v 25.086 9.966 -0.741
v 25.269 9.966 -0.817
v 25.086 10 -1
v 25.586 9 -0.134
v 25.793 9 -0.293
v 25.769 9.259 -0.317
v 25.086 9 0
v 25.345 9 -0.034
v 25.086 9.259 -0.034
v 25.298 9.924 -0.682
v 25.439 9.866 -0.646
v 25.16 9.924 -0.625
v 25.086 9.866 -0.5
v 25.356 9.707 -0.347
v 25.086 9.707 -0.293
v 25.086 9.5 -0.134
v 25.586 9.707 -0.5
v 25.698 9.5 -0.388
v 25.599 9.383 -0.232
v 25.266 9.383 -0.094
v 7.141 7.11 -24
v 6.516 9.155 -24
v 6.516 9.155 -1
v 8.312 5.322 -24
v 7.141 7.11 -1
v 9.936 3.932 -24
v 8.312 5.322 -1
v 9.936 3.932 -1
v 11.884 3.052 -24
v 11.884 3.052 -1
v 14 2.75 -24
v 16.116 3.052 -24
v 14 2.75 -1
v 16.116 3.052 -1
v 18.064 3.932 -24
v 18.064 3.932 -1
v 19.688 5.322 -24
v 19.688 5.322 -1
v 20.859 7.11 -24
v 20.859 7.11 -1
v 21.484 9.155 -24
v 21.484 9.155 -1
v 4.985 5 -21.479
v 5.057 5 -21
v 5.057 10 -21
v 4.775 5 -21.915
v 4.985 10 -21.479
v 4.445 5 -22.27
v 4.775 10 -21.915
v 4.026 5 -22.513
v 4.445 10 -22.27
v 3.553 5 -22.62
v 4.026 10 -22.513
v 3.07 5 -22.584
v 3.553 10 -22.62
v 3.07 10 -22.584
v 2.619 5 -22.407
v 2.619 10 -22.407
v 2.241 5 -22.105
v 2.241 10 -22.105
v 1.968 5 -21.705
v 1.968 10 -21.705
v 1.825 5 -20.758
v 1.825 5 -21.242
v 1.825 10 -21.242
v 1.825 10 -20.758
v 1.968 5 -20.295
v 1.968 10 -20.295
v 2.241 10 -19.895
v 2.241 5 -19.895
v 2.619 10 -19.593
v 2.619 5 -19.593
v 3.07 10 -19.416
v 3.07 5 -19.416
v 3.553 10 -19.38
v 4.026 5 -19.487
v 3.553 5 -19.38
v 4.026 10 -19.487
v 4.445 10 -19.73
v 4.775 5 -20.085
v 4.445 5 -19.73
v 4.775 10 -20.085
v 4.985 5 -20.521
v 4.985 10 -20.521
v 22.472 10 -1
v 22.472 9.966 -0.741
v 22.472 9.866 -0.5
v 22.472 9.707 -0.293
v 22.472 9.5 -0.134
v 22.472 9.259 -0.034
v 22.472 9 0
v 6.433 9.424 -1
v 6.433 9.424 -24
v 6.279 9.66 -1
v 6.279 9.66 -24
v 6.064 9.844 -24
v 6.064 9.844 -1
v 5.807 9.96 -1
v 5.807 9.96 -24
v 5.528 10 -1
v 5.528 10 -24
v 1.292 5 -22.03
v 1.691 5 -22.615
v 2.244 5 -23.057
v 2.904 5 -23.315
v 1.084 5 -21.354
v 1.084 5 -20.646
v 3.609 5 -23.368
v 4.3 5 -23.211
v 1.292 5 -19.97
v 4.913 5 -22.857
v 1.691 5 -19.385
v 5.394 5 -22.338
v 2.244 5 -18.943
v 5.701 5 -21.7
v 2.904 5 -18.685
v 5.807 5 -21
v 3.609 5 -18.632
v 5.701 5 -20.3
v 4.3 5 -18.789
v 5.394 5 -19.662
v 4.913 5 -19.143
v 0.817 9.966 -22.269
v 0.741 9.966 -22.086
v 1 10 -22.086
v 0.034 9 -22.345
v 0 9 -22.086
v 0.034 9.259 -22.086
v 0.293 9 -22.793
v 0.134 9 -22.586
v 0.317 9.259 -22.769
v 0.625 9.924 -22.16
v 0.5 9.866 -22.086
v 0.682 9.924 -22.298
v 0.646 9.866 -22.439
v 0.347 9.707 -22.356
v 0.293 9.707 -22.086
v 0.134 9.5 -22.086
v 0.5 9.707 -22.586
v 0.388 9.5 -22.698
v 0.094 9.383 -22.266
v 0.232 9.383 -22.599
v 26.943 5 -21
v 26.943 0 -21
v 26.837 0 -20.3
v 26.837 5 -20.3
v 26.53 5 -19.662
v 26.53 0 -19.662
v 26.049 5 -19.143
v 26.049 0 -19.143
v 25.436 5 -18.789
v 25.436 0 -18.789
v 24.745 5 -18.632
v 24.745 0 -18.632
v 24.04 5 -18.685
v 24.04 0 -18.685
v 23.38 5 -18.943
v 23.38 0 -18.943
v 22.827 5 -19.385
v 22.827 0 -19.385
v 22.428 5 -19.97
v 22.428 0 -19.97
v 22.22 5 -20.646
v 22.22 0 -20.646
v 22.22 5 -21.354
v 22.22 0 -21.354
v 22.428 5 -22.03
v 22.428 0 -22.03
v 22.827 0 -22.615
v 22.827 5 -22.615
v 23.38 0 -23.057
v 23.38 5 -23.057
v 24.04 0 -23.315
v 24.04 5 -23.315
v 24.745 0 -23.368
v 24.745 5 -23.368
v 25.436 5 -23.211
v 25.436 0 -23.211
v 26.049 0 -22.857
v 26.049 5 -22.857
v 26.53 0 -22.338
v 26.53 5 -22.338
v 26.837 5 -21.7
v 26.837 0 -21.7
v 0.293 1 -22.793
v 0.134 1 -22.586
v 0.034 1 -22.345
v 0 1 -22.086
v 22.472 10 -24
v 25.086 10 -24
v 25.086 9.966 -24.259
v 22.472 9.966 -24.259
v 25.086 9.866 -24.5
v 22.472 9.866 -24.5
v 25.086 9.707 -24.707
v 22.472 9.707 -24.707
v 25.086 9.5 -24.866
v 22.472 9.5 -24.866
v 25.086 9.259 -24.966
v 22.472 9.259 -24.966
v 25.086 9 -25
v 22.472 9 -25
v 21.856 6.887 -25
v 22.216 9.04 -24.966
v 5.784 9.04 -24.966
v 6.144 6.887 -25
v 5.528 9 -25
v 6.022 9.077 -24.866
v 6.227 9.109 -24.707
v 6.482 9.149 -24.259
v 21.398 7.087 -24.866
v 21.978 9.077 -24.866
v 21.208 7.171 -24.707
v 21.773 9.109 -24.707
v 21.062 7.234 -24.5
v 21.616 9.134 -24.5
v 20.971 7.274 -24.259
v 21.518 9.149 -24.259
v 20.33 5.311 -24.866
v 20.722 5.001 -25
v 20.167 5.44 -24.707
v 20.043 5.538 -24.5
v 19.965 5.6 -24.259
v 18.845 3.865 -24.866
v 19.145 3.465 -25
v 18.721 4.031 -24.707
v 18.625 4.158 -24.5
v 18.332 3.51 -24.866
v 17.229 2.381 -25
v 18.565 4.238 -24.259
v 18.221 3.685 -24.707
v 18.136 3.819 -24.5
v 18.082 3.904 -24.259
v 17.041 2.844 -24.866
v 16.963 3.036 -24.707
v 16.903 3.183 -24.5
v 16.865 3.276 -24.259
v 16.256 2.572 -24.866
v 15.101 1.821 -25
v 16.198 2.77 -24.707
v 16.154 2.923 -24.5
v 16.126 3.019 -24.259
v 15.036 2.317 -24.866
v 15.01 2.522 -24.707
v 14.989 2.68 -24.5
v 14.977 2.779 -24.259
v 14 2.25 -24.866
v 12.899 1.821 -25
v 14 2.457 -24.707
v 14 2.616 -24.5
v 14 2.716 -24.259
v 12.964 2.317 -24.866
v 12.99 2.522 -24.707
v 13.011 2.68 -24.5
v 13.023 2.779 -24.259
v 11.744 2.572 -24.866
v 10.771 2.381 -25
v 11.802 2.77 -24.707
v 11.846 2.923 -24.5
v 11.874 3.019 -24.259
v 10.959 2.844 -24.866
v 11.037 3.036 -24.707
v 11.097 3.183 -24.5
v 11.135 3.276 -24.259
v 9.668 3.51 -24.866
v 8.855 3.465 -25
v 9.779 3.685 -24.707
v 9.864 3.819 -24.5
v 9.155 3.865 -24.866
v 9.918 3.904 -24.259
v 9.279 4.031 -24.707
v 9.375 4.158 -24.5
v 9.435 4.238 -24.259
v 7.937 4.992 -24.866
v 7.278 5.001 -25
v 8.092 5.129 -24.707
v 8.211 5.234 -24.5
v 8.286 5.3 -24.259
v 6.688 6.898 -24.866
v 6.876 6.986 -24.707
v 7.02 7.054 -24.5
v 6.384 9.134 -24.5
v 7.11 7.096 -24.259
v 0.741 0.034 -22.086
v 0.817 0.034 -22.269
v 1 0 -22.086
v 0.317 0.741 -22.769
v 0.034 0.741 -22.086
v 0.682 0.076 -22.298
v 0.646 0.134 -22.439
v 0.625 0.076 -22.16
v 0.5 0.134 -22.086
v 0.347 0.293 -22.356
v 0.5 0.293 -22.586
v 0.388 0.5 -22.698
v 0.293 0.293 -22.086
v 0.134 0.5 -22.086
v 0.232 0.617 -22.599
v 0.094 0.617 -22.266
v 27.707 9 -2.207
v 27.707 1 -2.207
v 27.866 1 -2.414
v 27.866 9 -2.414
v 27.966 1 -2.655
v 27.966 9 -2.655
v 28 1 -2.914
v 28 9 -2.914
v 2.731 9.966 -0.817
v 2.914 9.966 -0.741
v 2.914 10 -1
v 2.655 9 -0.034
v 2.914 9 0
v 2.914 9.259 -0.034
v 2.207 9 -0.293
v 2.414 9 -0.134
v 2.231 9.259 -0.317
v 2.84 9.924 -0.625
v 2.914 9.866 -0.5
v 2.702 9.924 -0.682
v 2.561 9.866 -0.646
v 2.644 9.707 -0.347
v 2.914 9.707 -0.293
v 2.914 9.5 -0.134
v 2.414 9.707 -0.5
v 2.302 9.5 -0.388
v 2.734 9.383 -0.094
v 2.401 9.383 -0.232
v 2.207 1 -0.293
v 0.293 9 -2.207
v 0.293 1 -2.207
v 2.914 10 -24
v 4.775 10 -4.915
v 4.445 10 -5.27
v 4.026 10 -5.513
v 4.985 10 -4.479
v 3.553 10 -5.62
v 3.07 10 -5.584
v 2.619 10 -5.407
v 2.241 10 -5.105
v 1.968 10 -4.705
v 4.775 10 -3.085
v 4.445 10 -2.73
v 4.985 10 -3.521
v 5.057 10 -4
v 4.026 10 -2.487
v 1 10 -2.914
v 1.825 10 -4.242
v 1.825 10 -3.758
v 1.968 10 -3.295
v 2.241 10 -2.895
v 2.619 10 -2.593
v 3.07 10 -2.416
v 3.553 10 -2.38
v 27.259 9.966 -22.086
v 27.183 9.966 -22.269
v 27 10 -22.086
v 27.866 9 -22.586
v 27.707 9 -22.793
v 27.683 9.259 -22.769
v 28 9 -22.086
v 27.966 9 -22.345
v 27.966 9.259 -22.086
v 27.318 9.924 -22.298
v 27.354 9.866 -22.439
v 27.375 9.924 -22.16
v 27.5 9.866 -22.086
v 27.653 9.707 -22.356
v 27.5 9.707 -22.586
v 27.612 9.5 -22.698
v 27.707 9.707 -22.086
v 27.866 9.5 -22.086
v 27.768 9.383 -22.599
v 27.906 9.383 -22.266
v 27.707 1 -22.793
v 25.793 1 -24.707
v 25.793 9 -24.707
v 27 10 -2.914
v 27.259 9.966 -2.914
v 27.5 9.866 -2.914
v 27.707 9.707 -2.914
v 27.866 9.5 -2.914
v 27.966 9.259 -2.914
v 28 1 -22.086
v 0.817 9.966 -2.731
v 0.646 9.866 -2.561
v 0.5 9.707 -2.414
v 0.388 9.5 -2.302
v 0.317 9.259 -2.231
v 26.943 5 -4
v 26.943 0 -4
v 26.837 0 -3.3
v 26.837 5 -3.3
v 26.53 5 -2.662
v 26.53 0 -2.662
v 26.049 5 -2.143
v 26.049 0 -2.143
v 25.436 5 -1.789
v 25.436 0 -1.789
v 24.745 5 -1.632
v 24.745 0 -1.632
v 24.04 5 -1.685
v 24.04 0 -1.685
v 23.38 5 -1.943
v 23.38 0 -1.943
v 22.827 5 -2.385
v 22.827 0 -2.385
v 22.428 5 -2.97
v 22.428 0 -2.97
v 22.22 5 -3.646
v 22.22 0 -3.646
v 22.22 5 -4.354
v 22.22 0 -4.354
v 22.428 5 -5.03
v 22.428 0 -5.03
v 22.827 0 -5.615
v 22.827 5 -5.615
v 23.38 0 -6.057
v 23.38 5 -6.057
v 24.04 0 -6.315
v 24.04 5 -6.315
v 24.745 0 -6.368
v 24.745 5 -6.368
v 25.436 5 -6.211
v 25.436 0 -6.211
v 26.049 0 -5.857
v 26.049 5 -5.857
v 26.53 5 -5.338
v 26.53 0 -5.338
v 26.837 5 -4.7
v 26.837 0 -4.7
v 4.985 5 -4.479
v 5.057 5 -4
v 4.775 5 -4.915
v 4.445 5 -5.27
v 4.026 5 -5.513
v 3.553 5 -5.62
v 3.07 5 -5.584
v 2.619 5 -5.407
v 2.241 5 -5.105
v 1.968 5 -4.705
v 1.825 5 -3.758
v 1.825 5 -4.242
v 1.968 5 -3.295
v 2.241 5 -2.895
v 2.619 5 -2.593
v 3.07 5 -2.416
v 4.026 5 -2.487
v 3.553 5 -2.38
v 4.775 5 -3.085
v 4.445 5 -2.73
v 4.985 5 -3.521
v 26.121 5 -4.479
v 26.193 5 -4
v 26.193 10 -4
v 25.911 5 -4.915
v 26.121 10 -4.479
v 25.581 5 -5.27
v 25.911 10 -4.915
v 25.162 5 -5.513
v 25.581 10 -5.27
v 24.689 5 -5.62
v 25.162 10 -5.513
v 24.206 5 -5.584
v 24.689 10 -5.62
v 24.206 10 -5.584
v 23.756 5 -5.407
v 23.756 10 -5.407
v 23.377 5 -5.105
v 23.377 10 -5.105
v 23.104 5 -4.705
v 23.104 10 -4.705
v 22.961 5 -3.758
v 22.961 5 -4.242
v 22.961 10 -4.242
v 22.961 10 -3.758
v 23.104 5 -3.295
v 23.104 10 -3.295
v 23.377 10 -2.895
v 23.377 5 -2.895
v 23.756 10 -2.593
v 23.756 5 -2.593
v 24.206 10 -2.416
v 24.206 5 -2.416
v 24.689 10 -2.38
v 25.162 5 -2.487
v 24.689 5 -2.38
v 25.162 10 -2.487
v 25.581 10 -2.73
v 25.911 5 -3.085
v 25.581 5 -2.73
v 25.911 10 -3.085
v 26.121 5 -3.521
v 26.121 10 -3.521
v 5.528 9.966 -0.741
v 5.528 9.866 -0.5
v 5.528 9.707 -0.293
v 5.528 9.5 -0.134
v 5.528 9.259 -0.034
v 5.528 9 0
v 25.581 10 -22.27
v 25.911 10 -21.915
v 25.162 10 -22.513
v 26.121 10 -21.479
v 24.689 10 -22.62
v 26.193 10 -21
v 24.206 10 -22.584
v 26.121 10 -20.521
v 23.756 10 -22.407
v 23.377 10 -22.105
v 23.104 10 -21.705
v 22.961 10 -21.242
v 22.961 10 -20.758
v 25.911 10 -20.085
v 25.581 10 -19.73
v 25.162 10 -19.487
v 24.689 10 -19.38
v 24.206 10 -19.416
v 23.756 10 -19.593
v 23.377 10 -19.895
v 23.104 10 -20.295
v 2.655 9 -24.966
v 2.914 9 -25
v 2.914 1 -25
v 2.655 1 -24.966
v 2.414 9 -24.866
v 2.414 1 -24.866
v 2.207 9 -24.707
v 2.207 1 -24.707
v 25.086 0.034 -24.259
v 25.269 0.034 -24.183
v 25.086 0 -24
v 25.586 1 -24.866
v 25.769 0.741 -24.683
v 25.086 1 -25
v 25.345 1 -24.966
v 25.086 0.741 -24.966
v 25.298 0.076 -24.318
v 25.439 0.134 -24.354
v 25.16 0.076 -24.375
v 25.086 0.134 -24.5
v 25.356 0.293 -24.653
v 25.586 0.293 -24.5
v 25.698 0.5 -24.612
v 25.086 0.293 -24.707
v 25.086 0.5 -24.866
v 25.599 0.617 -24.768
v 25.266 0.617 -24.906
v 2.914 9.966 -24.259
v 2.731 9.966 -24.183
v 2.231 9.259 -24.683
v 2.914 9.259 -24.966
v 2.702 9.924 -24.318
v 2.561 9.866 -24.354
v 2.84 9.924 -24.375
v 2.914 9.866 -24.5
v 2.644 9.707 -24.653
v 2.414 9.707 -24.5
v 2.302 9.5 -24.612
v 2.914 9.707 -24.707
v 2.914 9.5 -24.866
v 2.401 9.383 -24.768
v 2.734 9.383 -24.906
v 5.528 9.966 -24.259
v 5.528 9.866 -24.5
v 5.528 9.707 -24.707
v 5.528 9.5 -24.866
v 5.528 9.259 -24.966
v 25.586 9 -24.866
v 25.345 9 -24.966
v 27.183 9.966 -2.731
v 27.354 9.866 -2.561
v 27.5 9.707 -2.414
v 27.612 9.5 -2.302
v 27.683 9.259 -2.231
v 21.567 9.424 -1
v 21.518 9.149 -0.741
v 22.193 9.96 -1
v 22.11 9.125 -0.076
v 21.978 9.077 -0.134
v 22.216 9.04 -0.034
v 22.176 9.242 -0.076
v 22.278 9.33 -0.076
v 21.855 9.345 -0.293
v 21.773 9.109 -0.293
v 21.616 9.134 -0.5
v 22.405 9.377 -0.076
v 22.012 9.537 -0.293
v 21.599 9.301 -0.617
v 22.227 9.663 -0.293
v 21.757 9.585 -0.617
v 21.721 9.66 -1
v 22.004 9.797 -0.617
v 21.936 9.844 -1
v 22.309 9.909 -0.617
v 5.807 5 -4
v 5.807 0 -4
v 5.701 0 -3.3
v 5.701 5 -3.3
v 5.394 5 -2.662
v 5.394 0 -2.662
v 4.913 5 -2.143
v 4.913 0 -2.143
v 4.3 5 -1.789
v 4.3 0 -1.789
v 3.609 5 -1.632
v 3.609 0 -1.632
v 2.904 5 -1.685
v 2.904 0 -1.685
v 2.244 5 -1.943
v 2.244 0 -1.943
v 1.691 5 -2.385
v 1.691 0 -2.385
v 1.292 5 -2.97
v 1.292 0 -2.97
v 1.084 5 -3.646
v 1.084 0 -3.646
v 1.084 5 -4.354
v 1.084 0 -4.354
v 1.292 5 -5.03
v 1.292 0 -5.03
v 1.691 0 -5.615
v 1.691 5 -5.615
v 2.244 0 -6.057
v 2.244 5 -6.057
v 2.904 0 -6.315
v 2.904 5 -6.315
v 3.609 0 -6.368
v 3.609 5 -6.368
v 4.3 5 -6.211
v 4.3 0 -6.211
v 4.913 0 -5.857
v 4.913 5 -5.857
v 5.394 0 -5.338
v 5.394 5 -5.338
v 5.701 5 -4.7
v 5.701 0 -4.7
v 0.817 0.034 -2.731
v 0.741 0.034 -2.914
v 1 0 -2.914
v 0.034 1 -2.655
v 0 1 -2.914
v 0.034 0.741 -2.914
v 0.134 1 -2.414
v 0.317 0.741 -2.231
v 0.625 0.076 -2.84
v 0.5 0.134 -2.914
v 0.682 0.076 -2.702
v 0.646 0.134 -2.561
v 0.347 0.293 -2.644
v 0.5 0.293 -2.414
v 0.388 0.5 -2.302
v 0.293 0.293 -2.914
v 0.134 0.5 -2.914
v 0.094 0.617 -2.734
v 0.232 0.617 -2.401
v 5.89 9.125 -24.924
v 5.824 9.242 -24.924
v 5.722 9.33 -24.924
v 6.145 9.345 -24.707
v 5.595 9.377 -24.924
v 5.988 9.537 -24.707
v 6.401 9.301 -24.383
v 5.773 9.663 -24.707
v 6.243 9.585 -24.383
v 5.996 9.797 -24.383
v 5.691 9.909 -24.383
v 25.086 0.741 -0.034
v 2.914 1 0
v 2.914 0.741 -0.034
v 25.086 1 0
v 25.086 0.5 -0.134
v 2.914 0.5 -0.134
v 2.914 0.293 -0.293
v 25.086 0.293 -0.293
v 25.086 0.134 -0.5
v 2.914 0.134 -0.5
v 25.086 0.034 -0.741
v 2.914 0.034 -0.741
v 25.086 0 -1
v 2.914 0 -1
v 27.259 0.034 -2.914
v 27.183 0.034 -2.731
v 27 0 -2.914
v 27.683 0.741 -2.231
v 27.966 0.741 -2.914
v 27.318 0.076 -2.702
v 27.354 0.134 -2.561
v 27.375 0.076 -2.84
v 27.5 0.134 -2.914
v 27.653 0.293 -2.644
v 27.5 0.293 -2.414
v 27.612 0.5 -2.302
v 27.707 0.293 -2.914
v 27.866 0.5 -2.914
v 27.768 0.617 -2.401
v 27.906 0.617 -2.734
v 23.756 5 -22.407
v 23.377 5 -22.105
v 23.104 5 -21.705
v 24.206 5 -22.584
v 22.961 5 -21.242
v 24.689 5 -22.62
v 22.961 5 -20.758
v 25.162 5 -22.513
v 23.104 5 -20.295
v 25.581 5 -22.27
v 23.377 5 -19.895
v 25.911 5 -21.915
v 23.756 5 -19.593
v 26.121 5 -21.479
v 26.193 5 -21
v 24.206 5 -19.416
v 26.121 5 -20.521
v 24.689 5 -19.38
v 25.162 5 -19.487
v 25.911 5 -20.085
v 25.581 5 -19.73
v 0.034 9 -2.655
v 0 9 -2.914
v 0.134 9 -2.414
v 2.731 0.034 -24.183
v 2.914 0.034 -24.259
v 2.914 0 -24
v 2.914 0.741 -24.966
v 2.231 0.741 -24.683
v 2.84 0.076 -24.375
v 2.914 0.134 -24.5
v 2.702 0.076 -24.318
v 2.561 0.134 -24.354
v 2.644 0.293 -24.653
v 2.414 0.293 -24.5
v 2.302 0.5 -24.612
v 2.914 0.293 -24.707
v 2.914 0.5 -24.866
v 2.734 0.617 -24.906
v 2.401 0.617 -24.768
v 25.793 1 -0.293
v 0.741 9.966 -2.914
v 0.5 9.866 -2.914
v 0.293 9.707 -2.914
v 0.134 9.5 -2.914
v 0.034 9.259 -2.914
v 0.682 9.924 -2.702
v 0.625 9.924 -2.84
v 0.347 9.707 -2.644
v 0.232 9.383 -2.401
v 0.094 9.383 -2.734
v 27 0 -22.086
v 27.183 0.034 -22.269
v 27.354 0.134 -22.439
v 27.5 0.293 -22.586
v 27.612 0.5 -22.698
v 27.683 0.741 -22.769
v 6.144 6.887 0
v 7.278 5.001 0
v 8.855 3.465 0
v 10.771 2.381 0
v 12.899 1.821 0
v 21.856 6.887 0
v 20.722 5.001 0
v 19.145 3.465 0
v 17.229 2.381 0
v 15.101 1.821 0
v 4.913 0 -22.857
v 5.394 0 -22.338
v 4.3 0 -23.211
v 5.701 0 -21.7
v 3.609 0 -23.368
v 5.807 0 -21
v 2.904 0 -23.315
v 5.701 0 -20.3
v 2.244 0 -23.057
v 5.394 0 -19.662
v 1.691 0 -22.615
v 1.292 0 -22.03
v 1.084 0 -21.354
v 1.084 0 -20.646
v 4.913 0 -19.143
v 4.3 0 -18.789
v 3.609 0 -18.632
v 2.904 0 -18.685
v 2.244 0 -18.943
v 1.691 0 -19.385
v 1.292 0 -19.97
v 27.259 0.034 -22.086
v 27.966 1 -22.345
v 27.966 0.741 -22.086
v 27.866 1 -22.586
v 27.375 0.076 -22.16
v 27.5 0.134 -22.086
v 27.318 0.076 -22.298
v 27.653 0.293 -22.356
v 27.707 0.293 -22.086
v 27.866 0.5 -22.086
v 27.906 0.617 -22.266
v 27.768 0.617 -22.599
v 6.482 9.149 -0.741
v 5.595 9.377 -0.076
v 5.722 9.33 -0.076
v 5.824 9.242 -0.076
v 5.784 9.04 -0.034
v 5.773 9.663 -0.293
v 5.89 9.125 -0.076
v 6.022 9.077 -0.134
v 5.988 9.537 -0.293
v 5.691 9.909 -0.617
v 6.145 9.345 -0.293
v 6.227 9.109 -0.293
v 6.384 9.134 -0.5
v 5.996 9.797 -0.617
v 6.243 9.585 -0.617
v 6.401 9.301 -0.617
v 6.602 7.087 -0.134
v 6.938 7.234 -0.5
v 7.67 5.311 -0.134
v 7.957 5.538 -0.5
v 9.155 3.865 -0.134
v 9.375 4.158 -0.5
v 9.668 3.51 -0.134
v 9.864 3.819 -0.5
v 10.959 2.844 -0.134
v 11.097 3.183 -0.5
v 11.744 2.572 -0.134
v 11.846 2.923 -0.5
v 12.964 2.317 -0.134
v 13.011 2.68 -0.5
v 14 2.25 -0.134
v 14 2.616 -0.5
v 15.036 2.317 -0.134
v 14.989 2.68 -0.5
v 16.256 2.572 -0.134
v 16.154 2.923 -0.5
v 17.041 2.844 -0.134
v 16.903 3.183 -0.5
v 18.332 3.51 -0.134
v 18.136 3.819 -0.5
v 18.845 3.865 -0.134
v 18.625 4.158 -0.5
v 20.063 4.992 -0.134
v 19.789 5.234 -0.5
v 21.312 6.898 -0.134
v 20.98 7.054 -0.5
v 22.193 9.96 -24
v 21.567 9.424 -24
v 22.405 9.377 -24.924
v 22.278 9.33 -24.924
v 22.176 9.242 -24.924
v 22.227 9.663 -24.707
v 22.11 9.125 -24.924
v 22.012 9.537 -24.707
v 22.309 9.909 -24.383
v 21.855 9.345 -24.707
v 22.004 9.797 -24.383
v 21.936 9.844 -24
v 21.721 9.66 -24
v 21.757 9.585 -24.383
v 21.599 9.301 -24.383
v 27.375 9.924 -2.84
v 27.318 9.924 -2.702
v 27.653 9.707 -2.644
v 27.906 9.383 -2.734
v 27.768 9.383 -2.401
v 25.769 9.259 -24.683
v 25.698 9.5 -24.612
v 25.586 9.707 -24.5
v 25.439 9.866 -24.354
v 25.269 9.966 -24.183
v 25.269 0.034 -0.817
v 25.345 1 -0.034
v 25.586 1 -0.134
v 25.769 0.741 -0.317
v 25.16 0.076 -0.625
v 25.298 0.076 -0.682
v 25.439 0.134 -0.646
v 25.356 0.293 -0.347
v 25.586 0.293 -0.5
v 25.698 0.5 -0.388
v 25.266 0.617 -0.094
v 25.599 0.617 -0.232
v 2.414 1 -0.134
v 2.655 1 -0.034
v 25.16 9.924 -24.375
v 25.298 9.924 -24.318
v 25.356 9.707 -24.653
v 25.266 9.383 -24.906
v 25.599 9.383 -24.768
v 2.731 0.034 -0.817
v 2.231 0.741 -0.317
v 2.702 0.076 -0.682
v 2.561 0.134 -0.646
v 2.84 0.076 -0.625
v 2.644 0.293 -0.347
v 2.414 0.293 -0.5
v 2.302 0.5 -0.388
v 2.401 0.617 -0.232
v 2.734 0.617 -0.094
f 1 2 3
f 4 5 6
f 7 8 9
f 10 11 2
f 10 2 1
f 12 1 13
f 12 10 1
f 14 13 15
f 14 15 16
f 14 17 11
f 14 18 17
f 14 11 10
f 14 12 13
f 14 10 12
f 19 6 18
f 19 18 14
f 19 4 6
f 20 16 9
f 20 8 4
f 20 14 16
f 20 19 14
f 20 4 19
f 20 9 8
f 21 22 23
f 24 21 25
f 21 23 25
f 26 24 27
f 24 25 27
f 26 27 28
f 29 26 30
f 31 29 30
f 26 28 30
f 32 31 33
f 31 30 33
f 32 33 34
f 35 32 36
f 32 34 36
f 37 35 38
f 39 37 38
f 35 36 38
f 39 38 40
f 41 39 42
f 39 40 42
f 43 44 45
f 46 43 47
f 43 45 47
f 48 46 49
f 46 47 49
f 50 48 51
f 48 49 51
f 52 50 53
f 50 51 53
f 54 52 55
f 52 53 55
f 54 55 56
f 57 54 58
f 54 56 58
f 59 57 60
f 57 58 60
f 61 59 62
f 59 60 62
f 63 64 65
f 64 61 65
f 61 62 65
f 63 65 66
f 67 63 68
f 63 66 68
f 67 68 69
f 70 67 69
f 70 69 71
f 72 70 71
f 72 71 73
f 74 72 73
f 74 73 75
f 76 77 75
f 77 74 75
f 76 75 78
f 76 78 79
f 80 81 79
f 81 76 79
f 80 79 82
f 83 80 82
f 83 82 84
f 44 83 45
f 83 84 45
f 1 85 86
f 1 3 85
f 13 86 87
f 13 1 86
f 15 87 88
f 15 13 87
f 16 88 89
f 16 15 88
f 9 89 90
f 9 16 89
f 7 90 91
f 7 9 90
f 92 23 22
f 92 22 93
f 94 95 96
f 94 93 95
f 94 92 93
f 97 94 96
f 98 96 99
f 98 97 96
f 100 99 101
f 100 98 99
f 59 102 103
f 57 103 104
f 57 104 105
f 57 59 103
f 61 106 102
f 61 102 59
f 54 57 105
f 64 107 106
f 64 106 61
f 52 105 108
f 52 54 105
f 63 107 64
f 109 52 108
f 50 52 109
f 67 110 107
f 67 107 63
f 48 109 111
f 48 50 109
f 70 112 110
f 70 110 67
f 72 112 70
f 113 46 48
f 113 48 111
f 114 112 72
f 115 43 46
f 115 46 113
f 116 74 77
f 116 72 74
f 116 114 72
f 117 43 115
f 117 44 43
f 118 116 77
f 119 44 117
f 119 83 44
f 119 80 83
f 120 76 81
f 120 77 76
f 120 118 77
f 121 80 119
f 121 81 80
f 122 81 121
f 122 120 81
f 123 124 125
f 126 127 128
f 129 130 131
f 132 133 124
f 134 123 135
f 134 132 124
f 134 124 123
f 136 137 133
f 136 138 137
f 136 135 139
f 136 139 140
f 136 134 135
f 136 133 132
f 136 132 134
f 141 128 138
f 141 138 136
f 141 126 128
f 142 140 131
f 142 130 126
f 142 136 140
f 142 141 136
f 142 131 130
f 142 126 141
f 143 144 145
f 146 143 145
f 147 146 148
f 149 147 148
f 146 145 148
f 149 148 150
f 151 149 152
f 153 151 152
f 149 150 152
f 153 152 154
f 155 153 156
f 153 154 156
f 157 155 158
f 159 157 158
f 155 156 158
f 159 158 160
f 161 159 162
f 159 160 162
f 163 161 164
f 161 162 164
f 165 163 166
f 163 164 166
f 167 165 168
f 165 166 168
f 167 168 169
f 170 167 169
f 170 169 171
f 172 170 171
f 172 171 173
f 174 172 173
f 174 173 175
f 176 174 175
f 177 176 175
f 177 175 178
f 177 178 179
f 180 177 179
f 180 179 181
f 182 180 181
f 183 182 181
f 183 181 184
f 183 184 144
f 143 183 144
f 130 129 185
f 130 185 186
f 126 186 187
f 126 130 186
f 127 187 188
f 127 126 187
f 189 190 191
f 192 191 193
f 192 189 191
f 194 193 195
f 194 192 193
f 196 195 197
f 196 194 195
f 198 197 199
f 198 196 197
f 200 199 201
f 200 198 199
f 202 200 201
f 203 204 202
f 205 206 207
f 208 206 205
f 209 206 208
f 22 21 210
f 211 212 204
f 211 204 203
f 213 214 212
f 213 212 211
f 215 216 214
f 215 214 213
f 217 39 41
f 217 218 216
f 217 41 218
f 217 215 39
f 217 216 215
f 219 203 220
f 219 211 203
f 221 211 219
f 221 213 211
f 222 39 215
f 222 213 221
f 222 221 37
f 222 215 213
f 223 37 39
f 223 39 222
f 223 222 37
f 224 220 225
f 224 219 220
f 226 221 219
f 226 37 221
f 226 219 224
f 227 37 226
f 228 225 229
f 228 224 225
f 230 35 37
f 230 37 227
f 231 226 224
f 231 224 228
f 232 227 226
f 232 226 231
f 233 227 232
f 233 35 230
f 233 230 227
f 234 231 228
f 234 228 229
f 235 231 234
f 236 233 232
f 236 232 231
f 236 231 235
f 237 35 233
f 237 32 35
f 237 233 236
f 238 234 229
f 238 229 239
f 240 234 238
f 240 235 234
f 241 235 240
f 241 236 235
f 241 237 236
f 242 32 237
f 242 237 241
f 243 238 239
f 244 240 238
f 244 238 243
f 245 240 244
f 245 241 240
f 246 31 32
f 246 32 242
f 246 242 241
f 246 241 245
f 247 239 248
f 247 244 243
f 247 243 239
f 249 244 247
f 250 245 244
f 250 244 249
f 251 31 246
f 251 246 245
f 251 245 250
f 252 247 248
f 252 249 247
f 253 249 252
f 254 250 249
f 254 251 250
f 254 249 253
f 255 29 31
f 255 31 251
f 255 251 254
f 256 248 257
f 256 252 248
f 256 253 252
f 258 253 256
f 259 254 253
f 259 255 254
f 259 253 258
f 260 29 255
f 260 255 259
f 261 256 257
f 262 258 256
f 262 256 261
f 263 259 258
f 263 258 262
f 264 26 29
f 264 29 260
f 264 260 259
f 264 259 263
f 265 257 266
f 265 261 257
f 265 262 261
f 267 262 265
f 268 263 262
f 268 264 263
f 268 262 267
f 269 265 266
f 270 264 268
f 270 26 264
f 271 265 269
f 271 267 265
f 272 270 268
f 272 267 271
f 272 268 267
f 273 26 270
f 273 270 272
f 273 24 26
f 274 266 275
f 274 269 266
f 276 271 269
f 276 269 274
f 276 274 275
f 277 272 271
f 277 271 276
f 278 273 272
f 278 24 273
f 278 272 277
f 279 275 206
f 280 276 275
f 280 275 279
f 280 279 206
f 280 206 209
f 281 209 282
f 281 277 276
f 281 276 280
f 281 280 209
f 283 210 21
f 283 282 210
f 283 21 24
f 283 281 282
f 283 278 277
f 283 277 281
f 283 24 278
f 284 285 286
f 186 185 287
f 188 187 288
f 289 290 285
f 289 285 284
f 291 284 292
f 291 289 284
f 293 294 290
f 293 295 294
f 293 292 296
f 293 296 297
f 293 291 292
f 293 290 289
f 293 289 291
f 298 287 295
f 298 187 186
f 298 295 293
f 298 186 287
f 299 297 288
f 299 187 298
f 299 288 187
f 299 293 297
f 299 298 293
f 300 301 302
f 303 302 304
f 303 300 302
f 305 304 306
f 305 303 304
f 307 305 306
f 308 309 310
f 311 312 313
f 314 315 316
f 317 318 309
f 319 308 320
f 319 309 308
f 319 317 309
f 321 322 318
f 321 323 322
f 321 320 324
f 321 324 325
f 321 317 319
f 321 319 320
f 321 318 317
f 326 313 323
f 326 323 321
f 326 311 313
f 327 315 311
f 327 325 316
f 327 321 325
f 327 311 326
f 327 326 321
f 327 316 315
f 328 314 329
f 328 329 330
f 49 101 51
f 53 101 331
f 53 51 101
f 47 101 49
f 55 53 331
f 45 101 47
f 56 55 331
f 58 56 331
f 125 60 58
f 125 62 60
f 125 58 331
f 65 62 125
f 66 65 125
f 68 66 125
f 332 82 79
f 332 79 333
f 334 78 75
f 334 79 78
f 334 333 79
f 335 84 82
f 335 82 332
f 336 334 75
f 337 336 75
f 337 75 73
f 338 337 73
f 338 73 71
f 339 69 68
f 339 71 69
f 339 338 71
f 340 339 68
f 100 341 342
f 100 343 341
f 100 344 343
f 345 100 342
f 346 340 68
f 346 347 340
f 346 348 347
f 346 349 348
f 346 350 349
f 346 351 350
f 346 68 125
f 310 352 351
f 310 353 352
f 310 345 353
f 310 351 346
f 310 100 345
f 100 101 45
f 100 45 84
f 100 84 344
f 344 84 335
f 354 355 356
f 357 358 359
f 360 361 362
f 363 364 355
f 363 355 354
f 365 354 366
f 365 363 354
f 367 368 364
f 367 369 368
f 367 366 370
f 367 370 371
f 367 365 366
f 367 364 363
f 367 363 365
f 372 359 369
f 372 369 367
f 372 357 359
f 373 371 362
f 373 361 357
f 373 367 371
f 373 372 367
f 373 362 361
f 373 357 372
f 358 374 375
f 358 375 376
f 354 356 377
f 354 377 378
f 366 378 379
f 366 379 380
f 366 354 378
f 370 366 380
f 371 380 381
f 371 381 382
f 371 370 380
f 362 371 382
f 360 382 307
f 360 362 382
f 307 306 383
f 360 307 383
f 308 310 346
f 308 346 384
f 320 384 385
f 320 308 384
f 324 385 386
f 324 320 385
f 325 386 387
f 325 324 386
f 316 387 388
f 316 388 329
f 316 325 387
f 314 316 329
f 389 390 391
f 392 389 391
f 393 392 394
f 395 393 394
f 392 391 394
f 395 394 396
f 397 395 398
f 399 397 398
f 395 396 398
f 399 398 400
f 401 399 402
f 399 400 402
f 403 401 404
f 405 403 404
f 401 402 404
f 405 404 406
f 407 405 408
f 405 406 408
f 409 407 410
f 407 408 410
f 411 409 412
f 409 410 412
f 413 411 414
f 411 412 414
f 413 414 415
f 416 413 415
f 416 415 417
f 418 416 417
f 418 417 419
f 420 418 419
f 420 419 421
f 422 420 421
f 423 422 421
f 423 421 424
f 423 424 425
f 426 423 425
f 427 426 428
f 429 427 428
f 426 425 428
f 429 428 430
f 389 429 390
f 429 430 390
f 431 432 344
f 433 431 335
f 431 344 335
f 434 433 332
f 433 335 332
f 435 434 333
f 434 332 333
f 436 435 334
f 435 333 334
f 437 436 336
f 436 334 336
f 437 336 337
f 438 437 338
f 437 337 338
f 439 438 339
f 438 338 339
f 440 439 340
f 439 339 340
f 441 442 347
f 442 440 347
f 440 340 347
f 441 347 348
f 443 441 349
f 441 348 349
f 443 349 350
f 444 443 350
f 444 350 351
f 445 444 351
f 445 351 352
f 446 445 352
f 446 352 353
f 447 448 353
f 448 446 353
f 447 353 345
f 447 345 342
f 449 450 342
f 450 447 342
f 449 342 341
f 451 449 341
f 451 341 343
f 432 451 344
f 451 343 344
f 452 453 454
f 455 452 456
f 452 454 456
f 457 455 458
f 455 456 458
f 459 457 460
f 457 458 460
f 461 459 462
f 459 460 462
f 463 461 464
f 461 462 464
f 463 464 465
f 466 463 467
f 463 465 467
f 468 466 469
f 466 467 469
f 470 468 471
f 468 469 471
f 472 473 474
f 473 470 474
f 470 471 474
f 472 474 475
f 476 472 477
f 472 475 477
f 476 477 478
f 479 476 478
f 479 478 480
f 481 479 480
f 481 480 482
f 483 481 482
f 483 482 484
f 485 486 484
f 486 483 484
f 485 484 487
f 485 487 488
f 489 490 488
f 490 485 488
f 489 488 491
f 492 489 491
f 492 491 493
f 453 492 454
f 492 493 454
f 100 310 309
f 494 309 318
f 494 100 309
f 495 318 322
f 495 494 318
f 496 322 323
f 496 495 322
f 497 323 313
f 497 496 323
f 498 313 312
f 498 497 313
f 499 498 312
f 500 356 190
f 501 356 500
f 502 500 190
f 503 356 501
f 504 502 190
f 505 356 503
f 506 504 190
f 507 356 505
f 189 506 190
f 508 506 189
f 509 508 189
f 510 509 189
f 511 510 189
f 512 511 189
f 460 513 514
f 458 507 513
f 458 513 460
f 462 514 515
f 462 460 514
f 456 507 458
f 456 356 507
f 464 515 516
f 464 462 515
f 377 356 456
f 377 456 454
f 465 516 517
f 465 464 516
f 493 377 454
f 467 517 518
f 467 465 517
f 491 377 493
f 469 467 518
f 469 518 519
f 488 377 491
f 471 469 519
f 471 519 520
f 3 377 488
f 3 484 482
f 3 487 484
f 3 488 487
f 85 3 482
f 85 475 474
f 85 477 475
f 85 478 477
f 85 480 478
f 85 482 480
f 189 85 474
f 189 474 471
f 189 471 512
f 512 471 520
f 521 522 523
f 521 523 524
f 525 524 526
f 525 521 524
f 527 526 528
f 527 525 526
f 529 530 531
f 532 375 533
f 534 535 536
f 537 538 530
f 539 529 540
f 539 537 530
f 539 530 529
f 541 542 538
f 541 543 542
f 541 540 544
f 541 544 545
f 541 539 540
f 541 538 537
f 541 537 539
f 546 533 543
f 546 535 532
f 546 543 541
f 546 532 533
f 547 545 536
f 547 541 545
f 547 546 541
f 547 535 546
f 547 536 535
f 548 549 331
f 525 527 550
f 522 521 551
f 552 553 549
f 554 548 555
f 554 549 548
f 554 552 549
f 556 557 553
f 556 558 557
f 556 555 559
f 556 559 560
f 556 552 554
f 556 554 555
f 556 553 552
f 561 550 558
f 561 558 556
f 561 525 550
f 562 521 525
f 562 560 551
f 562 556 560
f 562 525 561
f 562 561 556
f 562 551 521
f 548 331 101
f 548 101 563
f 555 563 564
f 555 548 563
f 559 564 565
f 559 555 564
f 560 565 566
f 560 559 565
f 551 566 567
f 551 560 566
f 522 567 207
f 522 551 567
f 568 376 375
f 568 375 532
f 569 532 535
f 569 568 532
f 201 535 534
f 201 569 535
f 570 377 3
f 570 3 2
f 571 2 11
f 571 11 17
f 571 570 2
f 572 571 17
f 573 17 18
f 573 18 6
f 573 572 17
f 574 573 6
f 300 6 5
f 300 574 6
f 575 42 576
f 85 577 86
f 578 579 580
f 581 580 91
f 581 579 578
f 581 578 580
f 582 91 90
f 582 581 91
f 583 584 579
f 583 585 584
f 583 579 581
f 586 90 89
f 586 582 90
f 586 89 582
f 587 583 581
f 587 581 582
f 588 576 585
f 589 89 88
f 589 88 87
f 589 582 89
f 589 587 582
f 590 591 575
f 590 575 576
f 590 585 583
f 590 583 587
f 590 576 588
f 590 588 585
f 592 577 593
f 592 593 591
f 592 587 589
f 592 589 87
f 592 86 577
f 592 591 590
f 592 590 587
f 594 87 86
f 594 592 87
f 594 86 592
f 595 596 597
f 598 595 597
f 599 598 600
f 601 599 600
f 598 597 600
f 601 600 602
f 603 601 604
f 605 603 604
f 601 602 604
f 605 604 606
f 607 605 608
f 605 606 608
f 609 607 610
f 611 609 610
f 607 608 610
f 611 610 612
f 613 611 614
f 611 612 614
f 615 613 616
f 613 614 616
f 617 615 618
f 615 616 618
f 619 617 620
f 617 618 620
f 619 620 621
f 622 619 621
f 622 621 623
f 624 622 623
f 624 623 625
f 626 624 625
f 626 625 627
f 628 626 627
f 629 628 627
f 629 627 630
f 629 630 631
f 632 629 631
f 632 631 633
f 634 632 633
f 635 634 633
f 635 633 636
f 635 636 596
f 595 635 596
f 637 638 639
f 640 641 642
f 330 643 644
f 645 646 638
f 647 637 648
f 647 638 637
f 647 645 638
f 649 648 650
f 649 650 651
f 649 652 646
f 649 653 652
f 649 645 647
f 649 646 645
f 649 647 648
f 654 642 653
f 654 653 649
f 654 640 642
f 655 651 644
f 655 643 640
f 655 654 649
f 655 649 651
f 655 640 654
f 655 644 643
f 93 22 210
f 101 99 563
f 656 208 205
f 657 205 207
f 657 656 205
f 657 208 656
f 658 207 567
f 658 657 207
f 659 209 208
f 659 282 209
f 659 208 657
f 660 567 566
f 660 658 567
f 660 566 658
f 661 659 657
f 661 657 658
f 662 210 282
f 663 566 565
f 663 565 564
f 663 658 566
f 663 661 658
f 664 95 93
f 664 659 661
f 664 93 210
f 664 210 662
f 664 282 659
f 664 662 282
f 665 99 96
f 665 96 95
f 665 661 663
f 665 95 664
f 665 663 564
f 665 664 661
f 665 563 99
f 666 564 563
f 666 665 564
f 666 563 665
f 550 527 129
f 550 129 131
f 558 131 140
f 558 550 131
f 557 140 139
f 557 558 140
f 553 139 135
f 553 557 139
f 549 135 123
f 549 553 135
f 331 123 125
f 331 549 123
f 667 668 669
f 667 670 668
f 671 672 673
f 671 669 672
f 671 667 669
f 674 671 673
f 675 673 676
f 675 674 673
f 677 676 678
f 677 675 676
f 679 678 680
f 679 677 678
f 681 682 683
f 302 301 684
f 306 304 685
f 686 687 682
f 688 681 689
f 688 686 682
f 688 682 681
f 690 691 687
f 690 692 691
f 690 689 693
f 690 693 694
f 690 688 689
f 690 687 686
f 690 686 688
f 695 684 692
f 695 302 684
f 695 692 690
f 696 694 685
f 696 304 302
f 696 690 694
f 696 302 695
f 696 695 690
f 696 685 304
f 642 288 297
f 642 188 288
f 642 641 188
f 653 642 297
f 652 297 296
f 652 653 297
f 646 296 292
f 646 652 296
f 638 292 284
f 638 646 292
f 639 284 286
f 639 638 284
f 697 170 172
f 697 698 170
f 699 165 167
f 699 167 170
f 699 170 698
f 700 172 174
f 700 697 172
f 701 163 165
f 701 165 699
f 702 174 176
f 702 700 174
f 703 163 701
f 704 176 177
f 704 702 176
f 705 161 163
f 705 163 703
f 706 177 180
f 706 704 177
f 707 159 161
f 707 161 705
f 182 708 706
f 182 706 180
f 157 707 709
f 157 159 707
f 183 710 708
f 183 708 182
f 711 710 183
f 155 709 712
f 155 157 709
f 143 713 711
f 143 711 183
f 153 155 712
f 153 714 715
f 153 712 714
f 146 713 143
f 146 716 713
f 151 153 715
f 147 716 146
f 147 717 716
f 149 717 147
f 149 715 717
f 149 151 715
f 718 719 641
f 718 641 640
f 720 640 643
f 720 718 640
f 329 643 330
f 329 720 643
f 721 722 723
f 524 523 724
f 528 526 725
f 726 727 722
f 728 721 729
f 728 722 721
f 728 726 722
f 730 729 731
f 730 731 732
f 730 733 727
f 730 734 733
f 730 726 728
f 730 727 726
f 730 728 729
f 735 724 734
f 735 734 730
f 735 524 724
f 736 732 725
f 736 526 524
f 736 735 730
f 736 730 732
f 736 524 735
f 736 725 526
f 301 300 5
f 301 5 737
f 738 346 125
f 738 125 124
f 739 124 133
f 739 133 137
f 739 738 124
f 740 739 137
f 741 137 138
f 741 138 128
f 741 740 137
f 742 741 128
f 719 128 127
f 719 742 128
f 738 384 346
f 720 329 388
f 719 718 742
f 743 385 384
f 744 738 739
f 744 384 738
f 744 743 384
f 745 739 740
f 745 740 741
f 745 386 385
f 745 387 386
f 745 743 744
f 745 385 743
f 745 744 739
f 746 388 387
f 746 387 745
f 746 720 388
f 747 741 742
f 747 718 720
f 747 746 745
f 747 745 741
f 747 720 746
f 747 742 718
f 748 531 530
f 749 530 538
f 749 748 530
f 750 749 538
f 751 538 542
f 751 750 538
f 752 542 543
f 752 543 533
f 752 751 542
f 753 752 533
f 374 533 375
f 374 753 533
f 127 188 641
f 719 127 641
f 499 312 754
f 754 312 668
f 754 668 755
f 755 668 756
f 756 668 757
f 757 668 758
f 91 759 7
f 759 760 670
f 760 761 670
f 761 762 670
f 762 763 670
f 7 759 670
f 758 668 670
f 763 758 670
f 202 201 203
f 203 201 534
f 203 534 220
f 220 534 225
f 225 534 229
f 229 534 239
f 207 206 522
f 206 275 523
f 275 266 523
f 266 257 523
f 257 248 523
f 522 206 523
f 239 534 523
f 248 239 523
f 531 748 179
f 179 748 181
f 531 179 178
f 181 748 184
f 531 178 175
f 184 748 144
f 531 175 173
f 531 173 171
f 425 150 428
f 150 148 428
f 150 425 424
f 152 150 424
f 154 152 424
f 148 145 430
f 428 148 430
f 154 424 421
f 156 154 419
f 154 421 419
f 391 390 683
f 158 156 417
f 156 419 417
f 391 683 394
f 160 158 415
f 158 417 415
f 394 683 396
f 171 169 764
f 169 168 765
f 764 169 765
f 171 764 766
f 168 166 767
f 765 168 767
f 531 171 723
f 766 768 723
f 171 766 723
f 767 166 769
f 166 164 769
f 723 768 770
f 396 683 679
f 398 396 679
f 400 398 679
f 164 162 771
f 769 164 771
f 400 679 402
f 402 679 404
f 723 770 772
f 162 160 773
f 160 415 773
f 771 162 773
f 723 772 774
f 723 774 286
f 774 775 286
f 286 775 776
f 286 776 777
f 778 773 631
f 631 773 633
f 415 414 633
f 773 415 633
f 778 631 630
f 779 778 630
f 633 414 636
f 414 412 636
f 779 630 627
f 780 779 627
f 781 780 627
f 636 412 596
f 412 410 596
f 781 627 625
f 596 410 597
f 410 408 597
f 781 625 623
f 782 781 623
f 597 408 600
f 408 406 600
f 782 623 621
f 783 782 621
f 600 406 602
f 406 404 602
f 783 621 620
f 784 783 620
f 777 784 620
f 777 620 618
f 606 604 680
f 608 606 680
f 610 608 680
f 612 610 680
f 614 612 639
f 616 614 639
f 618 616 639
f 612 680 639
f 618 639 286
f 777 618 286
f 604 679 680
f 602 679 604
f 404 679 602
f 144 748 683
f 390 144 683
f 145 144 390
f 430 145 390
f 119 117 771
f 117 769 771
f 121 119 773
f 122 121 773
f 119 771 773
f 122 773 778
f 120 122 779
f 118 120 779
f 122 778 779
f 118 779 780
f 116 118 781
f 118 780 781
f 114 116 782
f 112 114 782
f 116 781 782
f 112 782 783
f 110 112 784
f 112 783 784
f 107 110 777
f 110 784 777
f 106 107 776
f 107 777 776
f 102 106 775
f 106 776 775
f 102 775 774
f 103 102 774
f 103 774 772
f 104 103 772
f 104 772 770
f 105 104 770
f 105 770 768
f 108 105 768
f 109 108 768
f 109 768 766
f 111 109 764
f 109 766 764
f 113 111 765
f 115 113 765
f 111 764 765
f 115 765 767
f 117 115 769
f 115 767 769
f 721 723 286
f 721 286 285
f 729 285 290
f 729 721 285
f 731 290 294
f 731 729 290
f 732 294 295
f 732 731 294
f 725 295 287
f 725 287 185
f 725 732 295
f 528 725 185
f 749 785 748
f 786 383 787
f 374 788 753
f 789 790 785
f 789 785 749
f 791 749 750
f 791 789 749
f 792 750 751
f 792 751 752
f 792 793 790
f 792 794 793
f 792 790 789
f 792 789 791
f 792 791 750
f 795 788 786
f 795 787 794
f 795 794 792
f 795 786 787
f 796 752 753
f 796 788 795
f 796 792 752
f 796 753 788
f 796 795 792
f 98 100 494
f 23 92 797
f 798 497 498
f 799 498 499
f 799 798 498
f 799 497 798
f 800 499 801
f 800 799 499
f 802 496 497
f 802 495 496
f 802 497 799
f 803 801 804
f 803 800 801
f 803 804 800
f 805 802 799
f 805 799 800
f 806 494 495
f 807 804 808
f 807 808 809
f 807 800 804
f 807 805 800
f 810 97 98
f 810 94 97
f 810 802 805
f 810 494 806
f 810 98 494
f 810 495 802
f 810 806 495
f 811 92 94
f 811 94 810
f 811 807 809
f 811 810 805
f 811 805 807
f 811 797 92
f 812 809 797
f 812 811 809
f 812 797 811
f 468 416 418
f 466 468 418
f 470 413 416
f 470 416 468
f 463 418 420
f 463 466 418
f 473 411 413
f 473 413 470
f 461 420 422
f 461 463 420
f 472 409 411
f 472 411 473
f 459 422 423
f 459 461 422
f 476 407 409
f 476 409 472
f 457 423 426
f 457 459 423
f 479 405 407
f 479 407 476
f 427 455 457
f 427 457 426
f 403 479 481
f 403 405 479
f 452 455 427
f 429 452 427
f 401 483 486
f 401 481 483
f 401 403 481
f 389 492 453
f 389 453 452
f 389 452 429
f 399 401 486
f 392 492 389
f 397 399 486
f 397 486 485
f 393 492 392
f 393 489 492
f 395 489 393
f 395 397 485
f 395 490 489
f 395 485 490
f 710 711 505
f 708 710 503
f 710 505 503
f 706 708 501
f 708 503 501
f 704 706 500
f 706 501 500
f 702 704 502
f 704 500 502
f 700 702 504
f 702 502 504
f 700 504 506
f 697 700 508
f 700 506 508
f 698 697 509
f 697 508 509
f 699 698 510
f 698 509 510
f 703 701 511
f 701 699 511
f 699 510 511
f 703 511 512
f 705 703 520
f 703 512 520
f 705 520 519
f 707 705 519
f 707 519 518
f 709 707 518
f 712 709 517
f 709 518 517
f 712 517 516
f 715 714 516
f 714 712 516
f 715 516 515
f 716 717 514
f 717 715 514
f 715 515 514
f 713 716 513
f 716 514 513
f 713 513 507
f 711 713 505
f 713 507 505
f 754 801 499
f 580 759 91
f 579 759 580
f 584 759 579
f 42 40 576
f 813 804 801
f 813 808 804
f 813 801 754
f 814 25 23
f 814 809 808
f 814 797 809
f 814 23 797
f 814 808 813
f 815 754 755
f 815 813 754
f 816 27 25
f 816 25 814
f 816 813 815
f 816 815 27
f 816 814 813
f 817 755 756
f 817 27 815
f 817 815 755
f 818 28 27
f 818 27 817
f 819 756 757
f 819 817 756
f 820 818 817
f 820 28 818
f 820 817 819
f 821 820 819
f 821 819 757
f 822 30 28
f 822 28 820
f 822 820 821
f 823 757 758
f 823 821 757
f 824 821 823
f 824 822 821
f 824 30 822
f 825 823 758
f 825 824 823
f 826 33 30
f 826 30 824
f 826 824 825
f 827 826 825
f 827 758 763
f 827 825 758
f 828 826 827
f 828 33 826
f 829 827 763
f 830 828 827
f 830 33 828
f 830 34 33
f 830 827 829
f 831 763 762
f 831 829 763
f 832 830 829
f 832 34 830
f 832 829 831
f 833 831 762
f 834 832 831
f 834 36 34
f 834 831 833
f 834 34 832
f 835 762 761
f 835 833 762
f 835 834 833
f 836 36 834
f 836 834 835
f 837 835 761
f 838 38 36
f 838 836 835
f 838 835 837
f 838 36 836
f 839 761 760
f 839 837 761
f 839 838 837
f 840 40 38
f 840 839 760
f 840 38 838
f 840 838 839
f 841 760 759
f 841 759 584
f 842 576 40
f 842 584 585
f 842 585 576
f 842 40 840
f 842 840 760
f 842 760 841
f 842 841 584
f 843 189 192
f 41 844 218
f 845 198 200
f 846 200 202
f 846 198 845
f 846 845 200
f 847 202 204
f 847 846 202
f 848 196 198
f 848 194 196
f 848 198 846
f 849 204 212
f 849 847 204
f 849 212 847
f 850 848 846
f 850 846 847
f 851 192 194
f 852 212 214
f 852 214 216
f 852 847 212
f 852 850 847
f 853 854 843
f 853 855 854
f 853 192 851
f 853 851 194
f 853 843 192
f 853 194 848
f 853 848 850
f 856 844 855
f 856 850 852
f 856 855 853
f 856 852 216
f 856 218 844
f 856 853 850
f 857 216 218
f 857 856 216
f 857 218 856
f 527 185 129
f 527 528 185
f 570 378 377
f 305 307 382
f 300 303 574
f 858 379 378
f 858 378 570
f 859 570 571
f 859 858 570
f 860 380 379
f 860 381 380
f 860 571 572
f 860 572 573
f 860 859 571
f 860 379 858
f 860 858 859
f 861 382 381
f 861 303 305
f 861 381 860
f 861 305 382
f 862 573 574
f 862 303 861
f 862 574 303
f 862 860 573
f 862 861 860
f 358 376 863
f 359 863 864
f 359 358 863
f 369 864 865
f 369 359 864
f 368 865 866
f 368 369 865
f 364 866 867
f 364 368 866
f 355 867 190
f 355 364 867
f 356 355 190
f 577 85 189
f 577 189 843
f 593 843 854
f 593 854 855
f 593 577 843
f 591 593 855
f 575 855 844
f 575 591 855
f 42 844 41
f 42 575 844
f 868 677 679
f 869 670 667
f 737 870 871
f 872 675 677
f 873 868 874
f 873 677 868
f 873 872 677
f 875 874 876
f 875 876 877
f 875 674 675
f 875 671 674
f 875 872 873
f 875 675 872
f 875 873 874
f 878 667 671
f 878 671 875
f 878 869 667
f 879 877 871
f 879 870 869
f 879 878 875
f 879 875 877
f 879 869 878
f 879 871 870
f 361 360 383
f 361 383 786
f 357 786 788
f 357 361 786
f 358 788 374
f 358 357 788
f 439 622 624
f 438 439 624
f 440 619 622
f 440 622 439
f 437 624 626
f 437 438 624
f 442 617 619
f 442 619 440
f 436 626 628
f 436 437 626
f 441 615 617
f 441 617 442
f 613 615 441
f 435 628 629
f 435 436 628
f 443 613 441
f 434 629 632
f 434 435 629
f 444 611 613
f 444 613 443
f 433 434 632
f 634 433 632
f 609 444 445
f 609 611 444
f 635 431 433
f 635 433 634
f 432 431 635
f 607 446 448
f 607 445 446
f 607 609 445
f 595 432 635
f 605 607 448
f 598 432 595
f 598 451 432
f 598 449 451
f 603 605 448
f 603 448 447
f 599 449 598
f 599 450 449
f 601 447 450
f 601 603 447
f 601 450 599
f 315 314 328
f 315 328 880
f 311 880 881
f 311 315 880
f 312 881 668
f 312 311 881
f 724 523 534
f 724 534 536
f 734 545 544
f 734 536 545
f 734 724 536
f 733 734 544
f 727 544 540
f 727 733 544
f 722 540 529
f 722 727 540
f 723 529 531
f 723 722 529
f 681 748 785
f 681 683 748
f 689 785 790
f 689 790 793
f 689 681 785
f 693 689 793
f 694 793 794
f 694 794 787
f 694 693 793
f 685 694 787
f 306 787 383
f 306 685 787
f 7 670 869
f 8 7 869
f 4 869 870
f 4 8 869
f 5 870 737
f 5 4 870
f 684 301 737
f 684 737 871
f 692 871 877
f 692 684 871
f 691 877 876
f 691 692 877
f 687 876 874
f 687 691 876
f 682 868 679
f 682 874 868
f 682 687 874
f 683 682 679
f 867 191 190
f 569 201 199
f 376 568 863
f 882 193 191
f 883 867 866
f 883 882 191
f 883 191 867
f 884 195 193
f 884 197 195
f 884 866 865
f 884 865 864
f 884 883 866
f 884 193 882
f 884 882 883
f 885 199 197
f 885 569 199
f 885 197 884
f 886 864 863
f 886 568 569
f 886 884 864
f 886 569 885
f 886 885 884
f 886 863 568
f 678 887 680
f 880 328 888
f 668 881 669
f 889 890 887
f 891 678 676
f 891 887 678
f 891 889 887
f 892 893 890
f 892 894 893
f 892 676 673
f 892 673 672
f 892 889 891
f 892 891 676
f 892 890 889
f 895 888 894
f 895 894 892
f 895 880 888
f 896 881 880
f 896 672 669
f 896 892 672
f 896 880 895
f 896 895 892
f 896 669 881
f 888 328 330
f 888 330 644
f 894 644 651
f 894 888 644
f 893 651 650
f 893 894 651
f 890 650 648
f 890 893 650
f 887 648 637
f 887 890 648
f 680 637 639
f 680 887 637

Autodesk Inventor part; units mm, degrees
ref_plane "YZ Plane" through (0, 0, 0) normal (1, 0, 0) x (0, 1, 0)
ref_plane "XZ Plane" through (0, 0, 0) normal (0, 1, 0) x (-1, 0, 0)
ref_plane "XY Plane" through (0, 0, 0) normal (0, 0, 1) x (1, 0, 0)
sketch "Sketch1" plane through (0, 0, 0) normal (0, 1, 0) x (-1, 0, 0)
  line L0 (0, 0) -> (-28, 0)
  line L1 (-28, 0) -> (-28, -25)
  line L2 (-28, -25) -> (0, -25)
  line L3 (0, -25) -> (0, 0)
  line L4 (-24.8835, -25) -> (-24.8835, 0) construction
  line L5 (0, -1.9376) -> (-28, -1.9376) construction
  line L6 (-2.7003, -25) -> (-2.7003, 0) construction
  line L7 (0, -22.688) -> (-28, -22.688) construction
  line L8 (-34, -12.5) -> (0, -12.5) construction
  circle A0 centre (-34, -12.5) radius 6
  circle A1 centre (-34, -12.5) radius 9
  dimension "d0" = 28
  dimension "d1" = 25
  dimension "d31" = 12
  dimension "d32" = 12.5
  dimension "d33" = 18
extrude "Extrusion1" add sketch "Sketch1" along normal blind 10 contours L3 L2 L1 A1 L0 | A1 L1 picked at (-27.5773, -8.4946)
sketch "Sketch2" plane through (0, 0, 0) normal (0, 0, 1) x (1, 0, 0)
  line L0 (0, 0) -> (28, 0) projected
  line L1 (28, 0) -> (28, 10) projected
  line L2 (0, 10) -> (28, 10) projected
  line L3 (0, 0) -> (0, 10) projected
  line L4 (0, 0) -> (0, 10) construction
  line L5 (0, 2.75) -> (28, 2.75) construction
  line L6 (28, 0) -> (28, 10) construction
  circle A0 centre (14, 10.325) radius 7.575
  line L7 (0, 10) -> (28, 10) construction
  line L8 (14, 10) -> (14, 2.75) construction
  dimension "d4" = 7.25
  dimension "d5" = 15.15
extrude "Extrusion2" cut sketch "Sketch2" against normal through all contours A0 L2 | L2 A0
sketch "Sketch3" plane through (0, 10, 0) normal (0, 1, 0) x (1, 0, 0)
  line L0 (6.432, 0) -> (6.432, 25) projected
  line L1 (6.432, 25) -> (0, 25) projected
  line L2 (0, 25) -> (0, 0) projected
  line L3 (0, 0) -> (6.432, 0) projected
  line L4 (21.568, 25) -> (21.568, 0) projected
  line L5 (21.568, 0) -> (28, 0) projected
  line L6 (28, 0) -> (28, 25) projected
  line L7 (28, 25) -> (21.568, 25) projected
  line L8 (0, 21) -> (28, 21) construction
  line L9 (28, 0) -> (28, 25) construction
  line L10 (6.432, 25) -> (0, 25) construction
  line L11 (3.432, 25) -> (3.432, 0) construction
  line L12 (0, 0) -> (28, 0) construction
  line L13 (28, 25) -> (0, 25) construction
  line L14 (24.568, 25) -> (24.568, 0) construction
  line L15 (0, 25) -> (0, 0) construction
  line L16 (0, 4) -> (28, 4) construction
  circle A0 centre (3.432, 21) radius 1.625
  circle A1 centre (24.568, 21) radius 1.625
  circle A2 centre (3.432, 4) radius 1.625
  circle A3 centre (24.568, 4) radius 1.625
  dimension "d8" = 4
  dimension "d9" = 4
  dimension "d10" = 3
  dimension "d11" = 3
  dimension "d12" = 3.25
  dimension "d13" = 3.25
  dimension "d14" = 3.25
  dimension "d15" = 3.25
extrude "Extrusion3" cut sketch "Sketch3" against normal through all contours A0 | A1 | A2 | A3
chamfer "Chamfer1" distance 2.5 angle 45 4 edges at (0, 5, 0) (28, 5, 0) (28, 5, -25) (0, 5, -25)
fillet "Fillet1" radius 1 30 edges at (14, 0, -25) (2.5, 5, -25) (0, 5, -22.5) (1.25, 0, -23.75) (14, 2.75, -25) (14, 2.75, 0) (6.432, 10, -12.5) (21.568, 10, -12.5) (0, 10, -12.5) (1.25, 10, -1.25) (4.466, 10, 0) (4.466, 10, -25) (1.25, 10, -23.75) (23.534, 10, -25) (25.5, 5, -25) (28, 5, -22.5) (26.75, 0, -23.75) (26.75, 10, -23.75) (28, 10, -12.5) (26.75, 10, -1.25) (23.534, 10, 0) (28, 0, -12.5) (28, 5, -2.5) (26.75, 0, -1.25) (14, 0, 0) (1.25, 0, -1.25) (0, 0, -12.5) (25.5, 5, 0) (2.5, 5, 0) (0, 5, -2.5)
sketch "Sketch5" plane through (0, 0, 0) normal (0, -1, 0) x (1, 0, 0)
  circle A0 centre (3.432, -4) radius 1.625 projected
  circle A1 centre (3.432, -4) radius 2.375
  circle A2 centre (3.432, -21) radius 1.625 projected
  circle A3 centre (24.568, -21) radius 1.625 projected
  circle A4 centre (24.568, -4) radius 1.625 projected
  circle A5 centre (3.432, -21) radius 2.375
  circle A6 centre (24.568, -21) radius 2.375
  circle A7 centre (24.568, -4) radius 2.375
  point P0 (0, 0)
  dimension "d22" = 4.75
  dimension "d23" = 4.75
  dimension "d24" = 4.75
  dimension "d25" = 4.75
extrude "Extrusion4" cut sketch "Sketch5" against normal blind 5
equation "\"d9\" = d8"
equation "\"d11\" = d10"
equation "\"d13\" = d12"
equation "\"d14\" = d12"
equation "\"d15\" = d12"
properties part number "hotend_holder_pulley" material "ABS Plastic"
